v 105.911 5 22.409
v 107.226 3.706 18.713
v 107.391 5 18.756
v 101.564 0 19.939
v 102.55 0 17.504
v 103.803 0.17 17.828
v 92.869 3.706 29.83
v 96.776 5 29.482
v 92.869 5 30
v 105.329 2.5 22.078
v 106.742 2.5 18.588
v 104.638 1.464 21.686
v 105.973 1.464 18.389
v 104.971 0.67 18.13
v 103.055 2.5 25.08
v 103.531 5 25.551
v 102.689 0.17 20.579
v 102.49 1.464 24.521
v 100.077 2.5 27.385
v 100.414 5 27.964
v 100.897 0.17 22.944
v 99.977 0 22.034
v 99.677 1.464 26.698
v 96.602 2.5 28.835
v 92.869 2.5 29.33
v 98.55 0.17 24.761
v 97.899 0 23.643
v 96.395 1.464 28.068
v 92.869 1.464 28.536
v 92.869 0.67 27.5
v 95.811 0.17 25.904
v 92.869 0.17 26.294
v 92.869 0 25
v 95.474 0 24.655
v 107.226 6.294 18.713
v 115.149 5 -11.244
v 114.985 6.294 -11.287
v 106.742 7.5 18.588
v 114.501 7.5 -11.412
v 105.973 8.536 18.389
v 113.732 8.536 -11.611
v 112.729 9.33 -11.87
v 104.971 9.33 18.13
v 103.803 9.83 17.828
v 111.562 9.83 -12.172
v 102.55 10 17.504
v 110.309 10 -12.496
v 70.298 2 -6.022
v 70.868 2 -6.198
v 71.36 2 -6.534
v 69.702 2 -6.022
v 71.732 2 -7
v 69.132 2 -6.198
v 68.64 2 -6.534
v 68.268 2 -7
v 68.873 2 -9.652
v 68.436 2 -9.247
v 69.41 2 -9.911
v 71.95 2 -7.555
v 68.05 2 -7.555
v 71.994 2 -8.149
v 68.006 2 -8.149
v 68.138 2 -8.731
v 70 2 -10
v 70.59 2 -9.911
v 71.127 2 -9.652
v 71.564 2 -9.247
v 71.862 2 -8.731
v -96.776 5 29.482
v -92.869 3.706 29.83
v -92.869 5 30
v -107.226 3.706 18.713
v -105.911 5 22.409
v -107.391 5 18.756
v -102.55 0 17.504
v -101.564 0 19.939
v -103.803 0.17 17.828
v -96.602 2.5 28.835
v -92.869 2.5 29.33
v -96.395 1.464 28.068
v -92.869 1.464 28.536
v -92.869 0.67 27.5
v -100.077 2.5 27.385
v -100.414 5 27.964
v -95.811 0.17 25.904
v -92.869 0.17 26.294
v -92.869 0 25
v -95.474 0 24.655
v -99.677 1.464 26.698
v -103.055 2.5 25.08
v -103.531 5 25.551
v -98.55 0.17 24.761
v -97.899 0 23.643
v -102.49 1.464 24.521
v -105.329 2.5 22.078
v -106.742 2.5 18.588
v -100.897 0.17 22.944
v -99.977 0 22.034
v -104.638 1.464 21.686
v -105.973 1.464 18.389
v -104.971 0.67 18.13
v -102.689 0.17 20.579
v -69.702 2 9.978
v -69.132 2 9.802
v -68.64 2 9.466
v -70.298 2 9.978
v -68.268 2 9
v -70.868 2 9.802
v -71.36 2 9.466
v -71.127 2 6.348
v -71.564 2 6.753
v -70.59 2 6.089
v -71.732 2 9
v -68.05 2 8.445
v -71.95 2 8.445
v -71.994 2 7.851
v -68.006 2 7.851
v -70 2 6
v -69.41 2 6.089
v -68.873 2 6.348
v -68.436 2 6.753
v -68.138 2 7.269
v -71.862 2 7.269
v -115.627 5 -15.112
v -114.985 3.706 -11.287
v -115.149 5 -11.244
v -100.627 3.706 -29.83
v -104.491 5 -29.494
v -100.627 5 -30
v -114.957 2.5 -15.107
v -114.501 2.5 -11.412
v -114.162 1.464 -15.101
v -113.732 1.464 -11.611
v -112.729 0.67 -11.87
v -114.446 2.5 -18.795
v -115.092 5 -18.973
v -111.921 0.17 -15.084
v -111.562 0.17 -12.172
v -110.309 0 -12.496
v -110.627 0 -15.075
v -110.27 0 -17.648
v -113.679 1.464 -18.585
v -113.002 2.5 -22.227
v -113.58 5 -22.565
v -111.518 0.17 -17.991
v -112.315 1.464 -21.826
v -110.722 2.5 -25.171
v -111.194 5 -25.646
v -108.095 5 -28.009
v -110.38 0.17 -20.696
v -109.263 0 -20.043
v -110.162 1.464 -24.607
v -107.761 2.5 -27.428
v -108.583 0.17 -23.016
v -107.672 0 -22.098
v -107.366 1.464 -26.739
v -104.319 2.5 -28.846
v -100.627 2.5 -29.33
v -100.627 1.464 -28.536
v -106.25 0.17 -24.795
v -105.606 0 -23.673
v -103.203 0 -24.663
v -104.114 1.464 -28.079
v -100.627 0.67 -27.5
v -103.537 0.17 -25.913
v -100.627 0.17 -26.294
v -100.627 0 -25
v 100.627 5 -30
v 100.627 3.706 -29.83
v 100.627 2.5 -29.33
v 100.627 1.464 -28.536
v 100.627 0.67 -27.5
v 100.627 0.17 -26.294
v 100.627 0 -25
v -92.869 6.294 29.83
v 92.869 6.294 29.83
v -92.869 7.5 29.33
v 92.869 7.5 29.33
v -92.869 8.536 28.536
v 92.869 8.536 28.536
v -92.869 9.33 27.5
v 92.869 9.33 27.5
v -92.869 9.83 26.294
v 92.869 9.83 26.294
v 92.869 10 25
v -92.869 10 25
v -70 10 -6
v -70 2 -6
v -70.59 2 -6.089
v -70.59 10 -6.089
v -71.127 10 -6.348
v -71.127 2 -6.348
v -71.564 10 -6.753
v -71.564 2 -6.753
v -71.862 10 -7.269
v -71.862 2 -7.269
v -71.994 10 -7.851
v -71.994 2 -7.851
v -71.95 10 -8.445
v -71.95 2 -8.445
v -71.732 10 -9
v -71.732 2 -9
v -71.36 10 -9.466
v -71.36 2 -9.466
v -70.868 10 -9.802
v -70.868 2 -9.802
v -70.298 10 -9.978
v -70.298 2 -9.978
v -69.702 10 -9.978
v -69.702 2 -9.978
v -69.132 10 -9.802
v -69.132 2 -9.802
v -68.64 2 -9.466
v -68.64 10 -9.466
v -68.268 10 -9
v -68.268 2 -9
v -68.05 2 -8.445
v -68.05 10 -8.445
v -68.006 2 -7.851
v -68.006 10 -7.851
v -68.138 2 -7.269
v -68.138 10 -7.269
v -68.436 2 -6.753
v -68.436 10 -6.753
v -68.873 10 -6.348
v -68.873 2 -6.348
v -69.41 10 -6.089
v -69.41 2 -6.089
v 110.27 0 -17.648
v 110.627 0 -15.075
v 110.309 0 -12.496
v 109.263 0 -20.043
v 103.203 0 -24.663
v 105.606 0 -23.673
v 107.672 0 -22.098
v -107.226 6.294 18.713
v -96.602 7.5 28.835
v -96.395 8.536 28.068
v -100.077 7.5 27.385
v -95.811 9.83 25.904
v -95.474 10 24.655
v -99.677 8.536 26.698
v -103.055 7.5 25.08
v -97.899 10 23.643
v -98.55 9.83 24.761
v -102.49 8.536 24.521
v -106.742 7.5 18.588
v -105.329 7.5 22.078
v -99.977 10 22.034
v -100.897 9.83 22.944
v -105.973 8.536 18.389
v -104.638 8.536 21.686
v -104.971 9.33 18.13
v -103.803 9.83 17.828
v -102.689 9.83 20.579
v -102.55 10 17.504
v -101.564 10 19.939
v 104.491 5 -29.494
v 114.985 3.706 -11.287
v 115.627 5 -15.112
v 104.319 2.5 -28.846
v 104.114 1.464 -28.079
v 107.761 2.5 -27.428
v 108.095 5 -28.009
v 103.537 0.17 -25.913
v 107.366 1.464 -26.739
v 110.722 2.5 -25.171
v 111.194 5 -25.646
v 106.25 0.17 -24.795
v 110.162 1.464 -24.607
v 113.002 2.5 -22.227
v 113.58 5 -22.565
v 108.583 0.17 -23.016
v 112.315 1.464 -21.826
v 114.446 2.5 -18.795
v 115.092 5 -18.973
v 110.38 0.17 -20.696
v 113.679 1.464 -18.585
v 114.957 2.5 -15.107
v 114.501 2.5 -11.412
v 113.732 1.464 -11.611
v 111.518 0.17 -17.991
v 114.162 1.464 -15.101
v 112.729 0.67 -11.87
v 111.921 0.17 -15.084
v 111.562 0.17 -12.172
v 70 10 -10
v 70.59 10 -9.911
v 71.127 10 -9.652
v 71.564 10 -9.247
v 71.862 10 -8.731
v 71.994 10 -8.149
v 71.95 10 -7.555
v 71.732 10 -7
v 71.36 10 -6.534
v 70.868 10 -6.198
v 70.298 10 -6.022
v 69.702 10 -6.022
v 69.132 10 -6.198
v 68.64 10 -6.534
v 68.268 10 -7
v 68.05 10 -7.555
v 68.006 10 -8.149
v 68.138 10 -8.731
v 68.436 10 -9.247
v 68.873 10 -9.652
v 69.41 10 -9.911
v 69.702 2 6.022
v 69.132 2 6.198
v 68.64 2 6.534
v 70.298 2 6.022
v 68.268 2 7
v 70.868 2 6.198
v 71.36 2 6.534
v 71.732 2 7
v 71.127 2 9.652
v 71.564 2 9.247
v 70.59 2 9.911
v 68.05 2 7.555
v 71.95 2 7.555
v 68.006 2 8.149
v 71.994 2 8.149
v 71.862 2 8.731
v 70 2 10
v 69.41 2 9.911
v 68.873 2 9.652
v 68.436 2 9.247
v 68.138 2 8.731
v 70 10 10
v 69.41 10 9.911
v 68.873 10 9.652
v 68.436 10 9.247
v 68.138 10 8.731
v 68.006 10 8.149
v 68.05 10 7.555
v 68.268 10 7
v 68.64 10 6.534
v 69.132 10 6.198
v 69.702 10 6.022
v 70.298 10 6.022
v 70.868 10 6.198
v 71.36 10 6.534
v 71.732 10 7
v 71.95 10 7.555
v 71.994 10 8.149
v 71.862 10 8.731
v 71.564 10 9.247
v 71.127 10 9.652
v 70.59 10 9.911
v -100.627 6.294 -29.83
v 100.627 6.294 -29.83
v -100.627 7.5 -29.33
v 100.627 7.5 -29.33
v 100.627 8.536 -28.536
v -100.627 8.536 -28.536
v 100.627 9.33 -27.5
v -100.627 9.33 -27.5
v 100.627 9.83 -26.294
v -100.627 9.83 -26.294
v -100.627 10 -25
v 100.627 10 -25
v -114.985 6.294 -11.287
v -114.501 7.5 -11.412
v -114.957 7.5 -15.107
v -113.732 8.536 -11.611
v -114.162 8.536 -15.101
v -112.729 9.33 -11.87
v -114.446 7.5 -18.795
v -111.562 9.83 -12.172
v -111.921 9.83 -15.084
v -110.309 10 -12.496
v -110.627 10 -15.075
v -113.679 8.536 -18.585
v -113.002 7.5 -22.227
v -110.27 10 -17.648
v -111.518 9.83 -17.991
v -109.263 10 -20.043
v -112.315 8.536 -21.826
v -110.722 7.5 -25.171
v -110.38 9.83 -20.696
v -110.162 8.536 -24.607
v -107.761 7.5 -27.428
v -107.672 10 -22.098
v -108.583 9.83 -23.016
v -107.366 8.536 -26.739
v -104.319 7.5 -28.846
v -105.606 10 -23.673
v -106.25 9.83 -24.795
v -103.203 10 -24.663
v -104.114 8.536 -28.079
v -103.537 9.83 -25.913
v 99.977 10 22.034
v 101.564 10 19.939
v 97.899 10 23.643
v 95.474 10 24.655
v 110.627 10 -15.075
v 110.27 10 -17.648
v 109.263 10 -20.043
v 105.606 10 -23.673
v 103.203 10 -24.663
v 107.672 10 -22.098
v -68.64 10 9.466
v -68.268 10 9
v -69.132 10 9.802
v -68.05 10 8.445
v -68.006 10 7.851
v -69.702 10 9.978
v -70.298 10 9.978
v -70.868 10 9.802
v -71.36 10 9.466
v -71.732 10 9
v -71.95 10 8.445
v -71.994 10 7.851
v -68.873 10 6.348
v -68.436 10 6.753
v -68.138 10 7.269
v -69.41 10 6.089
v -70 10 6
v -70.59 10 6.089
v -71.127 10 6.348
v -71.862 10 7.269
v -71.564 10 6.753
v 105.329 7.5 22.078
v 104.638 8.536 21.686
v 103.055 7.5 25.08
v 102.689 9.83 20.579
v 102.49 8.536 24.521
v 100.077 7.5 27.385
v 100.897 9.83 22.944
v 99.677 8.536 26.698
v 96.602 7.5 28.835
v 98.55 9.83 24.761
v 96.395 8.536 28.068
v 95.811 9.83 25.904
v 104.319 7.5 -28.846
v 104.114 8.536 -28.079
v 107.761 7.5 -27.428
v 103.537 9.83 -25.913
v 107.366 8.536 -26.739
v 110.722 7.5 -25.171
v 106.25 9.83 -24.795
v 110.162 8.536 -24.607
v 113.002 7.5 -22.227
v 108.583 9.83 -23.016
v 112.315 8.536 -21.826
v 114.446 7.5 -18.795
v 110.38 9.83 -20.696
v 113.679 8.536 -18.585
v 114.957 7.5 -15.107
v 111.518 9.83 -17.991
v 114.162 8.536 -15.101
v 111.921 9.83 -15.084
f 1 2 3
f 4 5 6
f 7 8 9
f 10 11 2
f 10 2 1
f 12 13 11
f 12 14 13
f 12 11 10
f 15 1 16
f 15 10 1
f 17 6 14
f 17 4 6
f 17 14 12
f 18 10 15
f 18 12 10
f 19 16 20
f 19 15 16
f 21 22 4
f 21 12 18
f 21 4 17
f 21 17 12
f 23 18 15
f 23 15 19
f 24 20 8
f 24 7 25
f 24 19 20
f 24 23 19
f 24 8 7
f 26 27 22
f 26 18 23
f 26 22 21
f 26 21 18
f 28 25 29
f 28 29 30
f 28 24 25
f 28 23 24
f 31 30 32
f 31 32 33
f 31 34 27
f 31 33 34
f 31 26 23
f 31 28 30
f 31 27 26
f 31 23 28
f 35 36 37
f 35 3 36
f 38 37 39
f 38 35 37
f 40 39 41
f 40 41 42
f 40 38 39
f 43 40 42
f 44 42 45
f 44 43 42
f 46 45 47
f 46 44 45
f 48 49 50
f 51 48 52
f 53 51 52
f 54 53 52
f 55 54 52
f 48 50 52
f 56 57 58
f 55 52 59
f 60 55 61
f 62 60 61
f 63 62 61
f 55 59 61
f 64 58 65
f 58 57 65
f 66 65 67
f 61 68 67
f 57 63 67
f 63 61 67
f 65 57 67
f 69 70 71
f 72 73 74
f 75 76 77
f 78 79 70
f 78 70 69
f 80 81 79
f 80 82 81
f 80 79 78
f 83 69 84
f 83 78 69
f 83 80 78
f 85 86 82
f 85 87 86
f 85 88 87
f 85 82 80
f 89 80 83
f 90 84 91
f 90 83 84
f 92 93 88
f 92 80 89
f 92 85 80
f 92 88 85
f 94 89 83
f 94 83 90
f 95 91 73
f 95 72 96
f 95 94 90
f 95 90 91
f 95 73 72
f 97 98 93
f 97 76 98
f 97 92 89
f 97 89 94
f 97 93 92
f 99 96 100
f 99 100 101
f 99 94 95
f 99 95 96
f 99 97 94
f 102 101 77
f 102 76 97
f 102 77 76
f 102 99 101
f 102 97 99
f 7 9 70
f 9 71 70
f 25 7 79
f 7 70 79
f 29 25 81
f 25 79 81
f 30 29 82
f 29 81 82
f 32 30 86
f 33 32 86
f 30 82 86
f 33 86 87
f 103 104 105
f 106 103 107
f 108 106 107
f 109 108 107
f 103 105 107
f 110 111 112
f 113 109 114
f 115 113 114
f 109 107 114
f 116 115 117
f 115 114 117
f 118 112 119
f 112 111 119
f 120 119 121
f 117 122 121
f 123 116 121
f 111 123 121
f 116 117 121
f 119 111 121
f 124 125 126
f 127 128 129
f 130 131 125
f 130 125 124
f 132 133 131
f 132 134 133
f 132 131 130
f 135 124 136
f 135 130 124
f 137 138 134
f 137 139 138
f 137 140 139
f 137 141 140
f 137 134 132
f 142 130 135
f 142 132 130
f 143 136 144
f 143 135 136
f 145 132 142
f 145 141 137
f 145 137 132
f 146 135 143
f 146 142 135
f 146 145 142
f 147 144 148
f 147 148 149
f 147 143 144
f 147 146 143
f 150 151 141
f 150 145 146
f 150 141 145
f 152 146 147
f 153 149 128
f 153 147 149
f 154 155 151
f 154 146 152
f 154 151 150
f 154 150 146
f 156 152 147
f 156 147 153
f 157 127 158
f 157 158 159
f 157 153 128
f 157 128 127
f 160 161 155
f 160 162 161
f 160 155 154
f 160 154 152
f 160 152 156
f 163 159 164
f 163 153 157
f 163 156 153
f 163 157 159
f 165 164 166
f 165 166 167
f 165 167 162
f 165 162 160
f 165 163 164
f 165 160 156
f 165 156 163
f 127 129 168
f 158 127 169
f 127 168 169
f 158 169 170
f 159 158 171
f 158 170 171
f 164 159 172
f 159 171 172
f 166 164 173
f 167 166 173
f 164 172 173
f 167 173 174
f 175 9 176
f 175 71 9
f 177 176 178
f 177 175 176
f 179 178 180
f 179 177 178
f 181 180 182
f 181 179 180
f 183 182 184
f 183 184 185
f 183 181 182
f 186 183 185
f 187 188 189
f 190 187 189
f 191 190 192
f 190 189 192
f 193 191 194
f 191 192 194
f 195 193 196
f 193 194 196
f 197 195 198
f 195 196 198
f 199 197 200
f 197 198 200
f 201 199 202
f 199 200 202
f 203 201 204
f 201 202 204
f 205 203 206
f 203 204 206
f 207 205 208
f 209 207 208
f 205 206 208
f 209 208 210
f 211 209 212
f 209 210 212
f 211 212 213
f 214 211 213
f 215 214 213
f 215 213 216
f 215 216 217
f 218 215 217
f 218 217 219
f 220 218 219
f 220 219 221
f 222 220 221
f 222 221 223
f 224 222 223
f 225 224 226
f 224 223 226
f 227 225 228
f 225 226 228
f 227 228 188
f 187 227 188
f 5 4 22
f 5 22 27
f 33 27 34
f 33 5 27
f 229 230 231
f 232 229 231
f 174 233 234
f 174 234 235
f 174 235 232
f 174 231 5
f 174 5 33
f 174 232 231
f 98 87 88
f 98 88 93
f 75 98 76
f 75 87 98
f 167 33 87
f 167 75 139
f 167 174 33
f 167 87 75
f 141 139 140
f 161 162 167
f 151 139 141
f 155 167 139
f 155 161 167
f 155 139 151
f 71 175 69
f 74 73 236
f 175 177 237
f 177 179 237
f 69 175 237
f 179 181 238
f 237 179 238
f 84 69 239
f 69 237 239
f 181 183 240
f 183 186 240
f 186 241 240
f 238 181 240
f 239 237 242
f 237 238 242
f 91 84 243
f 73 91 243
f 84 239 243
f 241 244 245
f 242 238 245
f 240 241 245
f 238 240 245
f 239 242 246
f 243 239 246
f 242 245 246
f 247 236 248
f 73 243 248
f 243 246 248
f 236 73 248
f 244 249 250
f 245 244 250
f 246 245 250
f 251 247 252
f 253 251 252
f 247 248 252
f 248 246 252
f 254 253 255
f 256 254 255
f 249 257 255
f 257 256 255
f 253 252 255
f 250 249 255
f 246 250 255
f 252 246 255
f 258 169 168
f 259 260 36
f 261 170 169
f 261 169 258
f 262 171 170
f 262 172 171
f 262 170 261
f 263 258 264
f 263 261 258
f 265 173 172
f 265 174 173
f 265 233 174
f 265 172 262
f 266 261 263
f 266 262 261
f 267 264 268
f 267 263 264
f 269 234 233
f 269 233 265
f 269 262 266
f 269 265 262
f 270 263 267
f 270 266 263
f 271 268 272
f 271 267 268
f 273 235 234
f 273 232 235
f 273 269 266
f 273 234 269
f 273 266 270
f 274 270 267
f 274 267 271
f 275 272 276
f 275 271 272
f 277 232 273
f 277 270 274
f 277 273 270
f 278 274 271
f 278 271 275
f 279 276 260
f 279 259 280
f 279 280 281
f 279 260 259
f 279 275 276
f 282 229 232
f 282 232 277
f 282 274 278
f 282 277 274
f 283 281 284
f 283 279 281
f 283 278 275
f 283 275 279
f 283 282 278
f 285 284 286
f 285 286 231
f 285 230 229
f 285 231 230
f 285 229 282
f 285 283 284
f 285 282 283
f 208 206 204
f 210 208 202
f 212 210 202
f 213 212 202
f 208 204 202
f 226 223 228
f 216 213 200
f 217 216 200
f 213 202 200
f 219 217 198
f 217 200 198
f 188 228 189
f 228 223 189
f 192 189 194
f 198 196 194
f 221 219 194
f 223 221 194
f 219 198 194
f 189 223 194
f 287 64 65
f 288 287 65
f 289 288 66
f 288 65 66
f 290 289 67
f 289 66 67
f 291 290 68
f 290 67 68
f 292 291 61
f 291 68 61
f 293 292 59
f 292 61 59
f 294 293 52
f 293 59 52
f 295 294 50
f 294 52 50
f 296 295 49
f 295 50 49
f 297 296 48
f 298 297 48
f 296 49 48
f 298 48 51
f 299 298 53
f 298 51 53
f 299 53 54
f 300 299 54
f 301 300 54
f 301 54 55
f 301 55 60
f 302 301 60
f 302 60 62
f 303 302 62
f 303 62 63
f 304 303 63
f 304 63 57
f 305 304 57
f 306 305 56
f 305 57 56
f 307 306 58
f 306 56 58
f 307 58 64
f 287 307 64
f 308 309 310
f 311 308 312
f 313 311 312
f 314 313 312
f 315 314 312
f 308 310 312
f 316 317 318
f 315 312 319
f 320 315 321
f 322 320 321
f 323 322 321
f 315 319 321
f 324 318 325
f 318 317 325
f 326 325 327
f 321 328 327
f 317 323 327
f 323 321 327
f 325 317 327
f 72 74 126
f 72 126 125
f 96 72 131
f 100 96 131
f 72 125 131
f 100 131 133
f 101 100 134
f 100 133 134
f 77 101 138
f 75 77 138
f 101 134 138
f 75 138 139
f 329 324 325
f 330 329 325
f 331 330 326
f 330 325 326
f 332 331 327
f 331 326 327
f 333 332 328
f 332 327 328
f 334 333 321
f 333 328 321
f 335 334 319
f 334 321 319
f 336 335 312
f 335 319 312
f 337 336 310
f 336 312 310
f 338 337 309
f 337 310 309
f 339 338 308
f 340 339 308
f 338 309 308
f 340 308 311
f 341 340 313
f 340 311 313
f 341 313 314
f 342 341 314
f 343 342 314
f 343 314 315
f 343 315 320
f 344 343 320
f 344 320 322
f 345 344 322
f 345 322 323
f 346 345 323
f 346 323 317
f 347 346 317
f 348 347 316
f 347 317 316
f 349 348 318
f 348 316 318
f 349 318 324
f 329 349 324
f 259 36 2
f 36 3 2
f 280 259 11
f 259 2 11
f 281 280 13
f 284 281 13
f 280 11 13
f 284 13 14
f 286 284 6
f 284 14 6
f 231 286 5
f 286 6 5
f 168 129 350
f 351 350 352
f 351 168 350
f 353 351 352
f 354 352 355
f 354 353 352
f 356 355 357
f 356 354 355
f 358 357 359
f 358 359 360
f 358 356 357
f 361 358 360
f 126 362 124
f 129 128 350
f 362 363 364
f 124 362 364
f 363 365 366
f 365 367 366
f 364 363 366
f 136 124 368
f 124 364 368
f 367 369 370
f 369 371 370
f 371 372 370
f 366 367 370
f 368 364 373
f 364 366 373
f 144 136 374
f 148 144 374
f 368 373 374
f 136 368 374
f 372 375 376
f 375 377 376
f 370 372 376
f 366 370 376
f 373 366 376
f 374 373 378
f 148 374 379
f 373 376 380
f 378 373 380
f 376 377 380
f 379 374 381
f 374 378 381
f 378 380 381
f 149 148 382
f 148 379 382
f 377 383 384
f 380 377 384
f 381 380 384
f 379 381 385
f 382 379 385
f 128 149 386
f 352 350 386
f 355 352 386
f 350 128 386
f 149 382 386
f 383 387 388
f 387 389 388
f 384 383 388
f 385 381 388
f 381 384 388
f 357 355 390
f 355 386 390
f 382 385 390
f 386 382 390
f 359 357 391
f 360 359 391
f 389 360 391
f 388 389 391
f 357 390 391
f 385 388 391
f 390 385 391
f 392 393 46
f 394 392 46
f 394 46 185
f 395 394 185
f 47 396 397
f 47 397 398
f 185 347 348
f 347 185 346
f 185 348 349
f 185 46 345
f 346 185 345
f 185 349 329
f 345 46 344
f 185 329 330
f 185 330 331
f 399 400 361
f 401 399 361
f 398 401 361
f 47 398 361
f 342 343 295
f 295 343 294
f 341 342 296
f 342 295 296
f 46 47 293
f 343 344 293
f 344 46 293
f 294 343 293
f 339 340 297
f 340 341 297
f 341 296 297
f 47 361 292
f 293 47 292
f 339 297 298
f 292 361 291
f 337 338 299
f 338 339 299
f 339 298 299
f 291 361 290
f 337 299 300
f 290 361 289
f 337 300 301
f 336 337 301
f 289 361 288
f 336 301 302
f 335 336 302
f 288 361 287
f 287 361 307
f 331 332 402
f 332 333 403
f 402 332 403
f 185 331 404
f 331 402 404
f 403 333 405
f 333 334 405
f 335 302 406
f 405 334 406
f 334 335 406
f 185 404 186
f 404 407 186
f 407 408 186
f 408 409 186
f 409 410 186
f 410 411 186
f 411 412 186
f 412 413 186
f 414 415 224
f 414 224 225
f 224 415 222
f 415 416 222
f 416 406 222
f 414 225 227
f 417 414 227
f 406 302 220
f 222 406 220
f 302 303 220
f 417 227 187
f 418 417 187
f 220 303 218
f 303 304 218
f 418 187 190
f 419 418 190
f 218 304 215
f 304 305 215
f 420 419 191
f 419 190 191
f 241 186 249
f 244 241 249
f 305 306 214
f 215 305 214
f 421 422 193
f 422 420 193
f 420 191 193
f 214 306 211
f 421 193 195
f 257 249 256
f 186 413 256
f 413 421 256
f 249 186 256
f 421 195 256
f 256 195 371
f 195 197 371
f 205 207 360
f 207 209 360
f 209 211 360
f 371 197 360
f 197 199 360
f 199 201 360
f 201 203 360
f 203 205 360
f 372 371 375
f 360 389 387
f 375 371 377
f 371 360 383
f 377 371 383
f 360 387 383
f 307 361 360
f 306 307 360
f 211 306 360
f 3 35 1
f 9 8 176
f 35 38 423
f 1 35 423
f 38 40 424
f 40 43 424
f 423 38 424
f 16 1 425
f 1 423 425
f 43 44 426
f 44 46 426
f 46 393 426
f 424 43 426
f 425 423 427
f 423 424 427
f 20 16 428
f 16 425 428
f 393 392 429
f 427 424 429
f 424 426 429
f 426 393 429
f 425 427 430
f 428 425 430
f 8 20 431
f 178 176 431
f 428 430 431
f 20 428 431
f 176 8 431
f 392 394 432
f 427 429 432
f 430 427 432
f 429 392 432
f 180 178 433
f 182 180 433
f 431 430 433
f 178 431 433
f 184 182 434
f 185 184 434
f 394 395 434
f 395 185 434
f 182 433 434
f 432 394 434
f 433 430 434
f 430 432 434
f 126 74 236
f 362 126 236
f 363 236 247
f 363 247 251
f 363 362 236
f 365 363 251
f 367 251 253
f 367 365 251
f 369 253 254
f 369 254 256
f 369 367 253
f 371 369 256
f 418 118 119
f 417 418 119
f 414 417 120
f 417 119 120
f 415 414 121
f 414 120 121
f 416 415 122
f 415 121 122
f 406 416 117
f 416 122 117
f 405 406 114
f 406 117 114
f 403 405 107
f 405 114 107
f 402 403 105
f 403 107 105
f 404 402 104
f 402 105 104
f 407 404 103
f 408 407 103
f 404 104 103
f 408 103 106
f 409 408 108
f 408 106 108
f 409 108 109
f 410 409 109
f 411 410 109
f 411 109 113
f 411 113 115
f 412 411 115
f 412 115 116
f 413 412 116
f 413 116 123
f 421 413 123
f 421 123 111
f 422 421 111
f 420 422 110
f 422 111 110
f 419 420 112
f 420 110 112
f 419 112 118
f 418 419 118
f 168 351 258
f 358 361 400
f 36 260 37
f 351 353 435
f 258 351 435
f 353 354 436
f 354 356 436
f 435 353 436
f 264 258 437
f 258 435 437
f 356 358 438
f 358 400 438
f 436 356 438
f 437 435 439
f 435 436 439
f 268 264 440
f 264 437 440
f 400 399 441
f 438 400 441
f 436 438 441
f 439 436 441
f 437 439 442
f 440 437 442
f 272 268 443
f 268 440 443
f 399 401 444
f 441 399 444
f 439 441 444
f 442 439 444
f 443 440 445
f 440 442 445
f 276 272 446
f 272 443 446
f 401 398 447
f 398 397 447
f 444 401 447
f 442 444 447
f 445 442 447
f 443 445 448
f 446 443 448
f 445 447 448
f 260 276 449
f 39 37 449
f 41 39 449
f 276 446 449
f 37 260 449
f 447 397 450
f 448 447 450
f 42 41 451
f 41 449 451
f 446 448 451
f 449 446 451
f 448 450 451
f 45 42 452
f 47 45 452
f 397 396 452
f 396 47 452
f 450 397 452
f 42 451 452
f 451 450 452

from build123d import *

# Parameters (mm, degrees)
BOSS_EXTRUDE1_DEPTH = 10
FILLET1_R           = 5
CUT_EXTRUDE3_START  = -2
SKETCH3_R           = 2
CUT_EXTRUDE3_DEPTH  = 8


with BuildPart() as part:
    # Sketch1 → Boss-Extrude1 (new body)
    with BuildSketch(Plane(origin=(0, 0, 0), x_dir=(1, 0, 0), z_dir=(0, 1, 0))):
        with BuildLine():
            Line((115.149446157, 11.244299939), (107.390918627, -18.755700061))
            ThreePointArc((107.390918627, -18.755700061), (102.051963222, -26.860343606), (92.868704021, -30))
            Line((92.868704021, -30), (-92.868704021, -30))
            ThreePointArc((-92.868704021, -30), (-102.051963222, -26.860343606), (-107.390918627, -18.755700061))
            Line((-107.390918627, -18.755700061), (-115.149446157, 11.244299939))
            ThreePointArc((-115.149446157, 11.244299939), (-112.487575158, 24.183259201), (-100.627231552, 30))
            Line((-100.627231552, 30), (100.627231552, 30))
            ThreePointArc((100.627231552, 30), (112.487575158, 24.183259201), (115.149446157, 11.244299939))
        make_face()
    extrude(amount=BOSS_EXTRUDE1_DEPTH)

    # Fillet1
    fillet1_edges = [part.edges().sort_by_distance(p)[0] for p in [
        (0, 0, 30),
        (-102.051963222, 0, 26.860343606),
        (-111.270182392, 0, 3.755700061),
        (-112.487575158, 0, -24.183259201),
        (0, 10, 30),
        (102.051963222, 10, 26.860343606),
        (111.270182392, 10, 3.755700061),
        (112.487575158, 10, -24.183259201),
        (0, 10, -30),
        (0, 0, -30),
        (-111.270182392, 10, 3.755700061),
        (111.270182392, 0, 3.755700061),
    ]]
    fillet(fillet1_edges, radius=FILLET1_R - 0.0001)  # a hair under: the kernel refuses the full size

    # Sketch3 → Cut-Extrude3 (cut)
    with BuildSketch(Plane.XZ.offset(CUT_EXTRUDE3_START)):
        with Locations(Location((-70, 8, 0), (0, 0, 270))):
            Circle(SKETCH3_R)
        with Locations(Location((-70, -8, 0), (0, 0, 90))):
            Circle(SKETCH3_R)
        with Locations(Location((70, -8, 0), (0, 0, 270))):
            Circle(SKETCH3_R)
        with Locations(Location((70, 8, 0), (0, 0, 90))):
            Circle(SKETCH3_R)
    extrude(amount=-CUT_EXTRUDE3_DEPTH, mode=Mode.SUBTRACT)


solid = part.part
